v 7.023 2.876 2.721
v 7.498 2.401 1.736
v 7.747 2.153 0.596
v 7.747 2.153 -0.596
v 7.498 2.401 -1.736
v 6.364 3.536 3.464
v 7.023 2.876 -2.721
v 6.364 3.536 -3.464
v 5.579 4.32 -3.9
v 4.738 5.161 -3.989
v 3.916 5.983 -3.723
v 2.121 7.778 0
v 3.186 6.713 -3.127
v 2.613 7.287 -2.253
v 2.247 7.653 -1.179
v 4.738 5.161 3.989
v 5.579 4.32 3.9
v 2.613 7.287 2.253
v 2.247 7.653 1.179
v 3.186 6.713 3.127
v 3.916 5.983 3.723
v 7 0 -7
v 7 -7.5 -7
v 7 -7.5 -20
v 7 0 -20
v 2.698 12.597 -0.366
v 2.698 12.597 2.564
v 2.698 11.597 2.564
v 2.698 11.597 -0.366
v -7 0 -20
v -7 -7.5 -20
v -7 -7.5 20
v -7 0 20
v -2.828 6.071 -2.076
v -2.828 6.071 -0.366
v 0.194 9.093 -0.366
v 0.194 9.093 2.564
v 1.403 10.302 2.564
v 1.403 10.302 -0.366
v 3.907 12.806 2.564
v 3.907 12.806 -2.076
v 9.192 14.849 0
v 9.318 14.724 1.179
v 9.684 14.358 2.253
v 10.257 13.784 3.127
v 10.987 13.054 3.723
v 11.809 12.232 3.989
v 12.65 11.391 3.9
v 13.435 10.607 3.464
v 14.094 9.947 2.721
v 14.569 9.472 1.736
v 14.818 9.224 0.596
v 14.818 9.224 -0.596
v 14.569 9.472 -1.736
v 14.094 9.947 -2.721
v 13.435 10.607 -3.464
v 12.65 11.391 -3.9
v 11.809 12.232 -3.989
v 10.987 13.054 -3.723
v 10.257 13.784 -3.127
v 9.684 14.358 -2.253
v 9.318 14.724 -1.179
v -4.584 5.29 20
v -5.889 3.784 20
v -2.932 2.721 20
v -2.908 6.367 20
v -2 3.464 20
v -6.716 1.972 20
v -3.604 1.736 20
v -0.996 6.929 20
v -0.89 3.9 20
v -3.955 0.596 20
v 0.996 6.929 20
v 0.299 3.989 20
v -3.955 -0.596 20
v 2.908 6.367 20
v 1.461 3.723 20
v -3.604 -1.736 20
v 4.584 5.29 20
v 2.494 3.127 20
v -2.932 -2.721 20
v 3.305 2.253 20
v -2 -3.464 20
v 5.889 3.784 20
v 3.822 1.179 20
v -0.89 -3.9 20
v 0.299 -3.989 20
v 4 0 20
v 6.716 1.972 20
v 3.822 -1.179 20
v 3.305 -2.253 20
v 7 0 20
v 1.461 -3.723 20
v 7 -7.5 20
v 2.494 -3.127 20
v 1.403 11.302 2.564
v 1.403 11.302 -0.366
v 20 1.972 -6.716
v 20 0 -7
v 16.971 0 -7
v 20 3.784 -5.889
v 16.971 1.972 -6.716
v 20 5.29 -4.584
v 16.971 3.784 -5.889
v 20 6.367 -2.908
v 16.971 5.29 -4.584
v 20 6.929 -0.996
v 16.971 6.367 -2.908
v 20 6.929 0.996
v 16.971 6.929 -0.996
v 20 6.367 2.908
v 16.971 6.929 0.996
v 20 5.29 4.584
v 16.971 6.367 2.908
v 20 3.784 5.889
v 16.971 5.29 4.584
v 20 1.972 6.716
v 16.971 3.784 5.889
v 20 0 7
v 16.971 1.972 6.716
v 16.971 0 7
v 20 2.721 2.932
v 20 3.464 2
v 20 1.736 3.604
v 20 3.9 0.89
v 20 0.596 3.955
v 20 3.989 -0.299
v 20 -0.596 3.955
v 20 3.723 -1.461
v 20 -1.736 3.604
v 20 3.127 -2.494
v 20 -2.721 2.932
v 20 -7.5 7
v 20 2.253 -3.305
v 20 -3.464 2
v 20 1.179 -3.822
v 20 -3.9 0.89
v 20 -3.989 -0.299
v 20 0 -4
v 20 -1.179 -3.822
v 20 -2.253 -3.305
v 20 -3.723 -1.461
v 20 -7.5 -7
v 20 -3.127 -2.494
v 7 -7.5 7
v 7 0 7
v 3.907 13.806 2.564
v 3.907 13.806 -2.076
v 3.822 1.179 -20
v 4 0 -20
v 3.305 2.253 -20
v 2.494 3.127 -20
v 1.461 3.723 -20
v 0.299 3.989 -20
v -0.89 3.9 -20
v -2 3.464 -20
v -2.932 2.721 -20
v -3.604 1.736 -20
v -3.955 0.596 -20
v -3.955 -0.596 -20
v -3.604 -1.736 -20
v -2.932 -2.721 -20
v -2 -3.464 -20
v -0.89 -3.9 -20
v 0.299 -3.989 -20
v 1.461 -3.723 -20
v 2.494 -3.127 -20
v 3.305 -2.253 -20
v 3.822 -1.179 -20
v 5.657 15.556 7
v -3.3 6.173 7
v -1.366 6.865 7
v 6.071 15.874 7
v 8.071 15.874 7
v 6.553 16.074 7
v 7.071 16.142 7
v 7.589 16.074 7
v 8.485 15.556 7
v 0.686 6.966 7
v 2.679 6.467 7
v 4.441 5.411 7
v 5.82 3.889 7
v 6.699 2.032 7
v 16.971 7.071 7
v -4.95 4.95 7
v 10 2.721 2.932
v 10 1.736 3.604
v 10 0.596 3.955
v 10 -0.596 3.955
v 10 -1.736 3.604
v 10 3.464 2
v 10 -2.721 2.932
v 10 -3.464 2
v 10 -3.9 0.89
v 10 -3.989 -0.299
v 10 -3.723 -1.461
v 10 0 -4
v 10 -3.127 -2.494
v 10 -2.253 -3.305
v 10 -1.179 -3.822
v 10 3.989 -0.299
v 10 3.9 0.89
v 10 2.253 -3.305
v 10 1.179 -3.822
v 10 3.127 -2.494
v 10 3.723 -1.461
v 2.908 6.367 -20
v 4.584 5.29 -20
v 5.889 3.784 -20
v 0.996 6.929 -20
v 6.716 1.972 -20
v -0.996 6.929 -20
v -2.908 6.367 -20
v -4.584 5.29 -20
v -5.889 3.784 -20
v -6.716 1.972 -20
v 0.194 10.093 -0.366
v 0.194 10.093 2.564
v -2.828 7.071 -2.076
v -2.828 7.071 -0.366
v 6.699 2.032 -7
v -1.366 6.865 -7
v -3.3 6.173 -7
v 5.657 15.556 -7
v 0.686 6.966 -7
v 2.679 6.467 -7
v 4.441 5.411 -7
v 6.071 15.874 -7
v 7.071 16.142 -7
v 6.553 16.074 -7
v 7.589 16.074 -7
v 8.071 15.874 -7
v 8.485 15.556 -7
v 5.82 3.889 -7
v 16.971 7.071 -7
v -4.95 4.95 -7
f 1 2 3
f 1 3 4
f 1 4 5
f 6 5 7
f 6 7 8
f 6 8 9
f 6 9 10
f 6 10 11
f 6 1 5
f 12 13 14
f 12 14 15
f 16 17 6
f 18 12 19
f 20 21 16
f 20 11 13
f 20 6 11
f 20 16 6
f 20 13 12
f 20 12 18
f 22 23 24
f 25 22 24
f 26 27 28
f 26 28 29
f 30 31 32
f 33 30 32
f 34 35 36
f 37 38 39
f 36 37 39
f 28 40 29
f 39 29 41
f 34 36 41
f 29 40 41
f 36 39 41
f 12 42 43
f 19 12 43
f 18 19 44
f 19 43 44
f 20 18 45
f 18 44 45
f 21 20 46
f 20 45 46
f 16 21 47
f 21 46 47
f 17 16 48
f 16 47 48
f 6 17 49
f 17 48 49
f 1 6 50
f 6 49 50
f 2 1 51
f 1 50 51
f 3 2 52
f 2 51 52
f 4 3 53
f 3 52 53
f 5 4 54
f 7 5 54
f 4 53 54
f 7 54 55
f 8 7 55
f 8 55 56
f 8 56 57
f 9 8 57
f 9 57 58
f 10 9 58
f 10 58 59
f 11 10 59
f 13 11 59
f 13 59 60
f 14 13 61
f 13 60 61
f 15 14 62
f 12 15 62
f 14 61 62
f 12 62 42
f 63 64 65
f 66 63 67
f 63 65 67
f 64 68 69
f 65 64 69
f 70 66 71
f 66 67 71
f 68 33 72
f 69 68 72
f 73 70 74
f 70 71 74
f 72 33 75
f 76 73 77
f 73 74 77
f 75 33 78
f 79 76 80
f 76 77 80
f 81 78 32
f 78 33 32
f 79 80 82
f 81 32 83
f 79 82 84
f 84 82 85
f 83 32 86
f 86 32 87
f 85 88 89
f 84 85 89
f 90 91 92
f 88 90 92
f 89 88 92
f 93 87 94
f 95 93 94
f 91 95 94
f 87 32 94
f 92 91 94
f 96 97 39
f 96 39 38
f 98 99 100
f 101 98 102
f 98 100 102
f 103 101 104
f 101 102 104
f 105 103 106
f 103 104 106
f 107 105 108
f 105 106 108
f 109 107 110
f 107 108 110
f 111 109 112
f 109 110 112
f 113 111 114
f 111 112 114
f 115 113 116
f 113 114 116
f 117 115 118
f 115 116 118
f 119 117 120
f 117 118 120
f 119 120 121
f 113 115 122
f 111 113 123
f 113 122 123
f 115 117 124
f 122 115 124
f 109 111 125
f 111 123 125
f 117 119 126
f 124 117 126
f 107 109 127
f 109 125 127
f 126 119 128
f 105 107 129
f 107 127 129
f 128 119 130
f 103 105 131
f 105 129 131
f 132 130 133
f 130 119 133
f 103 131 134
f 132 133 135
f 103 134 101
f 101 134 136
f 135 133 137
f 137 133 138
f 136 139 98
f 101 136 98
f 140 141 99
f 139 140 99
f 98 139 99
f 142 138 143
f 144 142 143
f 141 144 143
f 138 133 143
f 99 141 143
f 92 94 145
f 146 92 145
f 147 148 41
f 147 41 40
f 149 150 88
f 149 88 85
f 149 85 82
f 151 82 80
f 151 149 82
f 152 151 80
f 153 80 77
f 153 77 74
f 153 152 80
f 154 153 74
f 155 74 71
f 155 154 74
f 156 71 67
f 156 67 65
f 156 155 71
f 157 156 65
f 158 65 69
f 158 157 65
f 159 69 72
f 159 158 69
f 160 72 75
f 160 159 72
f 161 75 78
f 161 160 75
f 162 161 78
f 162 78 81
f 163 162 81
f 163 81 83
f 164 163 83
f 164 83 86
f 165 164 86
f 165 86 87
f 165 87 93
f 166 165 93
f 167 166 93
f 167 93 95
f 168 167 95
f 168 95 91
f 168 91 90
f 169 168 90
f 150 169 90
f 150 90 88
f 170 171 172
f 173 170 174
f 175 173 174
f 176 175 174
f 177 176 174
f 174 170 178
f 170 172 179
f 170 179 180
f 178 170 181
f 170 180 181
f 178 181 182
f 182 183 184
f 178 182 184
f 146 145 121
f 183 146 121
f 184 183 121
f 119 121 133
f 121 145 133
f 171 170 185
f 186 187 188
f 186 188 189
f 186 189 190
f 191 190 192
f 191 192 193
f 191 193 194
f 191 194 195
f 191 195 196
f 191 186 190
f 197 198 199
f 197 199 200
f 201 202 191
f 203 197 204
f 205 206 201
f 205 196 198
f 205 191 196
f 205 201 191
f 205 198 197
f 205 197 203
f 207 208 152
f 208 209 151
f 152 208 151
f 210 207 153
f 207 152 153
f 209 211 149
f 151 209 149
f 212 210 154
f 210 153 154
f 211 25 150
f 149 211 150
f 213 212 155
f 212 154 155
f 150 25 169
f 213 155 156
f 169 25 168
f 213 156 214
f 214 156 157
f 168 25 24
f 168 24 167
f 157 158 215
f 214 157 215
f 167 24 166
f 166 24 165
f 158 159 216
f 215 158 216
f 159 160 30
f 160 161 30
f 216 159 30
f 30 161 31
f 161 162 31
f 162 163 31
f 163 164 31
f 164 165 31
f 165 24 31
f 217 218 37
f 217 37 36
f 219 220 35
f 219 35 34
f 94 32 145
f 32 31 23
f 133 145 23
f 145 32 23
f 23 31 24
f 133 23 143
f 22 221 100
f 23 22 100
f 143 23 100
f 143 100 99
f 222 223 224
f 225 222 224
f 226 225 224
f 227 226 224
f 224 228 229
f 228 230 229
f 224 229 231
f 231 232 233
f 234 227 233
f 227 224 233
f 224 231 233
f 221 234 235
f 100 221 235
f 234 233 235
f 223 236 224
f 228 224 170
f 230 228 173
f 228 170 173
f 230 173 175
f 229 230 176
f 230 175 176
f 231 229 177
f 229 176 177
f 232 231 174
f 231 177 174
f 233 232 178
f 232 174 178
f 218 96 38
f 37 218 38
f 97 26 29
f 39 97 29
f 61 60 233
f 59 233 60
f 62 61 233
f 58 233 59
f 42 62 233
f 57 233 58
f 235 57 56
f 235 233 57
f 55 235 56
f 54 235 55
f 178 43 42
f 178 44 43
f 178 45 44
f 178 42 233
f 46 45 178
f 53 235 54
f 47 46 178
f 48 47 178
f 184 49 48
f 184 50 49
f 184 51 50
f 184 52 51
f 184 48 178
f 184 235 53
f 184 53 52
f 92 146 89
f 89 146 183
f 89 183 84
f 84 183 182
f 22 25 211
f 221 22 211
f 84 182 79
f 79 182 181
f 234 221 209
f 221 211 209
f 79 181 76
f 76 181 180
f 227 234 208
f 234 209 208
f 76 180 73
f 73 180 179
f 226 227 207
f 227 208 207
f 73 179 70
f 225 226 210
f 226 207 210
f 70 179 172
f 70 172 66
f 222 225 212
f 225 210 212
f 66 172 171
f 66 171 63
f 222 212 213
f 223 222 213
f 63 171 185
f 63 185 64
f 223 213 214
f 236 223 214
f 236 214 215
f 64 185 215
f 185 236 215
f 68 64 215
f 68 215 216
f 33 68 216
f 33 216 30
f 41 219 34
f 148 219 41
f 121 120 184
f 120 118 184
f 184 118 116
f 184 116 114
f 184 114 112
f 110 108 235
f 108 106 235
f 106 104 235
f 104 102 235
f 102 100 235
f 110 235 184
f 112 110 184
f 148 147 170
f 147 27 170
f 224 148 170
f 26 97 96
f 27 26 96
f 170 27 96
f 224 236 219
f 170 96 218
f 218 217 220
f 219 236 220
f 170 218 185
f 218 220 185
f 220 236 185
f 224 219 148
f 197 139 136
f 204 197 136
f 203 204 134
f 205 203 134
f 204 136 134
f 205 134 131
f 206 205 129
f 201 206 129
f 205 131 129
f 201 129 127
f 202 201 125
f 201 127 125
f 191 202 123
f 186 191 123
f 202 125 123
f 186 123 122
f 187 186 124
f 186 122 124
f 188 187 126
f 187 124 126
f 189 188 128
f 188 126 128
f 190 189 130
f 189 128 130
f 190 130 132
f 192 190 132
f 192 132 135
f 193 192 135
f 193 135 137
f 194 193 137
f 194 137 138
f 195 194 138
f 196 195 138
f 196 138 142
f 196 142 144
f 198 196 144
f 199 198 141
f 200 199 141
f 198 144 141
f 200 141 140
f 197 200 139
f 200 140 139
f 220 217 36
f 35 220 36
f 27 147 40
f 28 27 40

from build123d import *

# Parameters (mm, degrees)
DODANIE_WYCI_GNI_CIE1_DEPTH      = 20
DODANIE_WYCI_GNI_CIE1_DEPTH_BACK = 20
SZKIC1_R                         = 7
SZKIC1_R_2                       = 4
DODANIE_WYCI_GNI_CIE2_DEPTH      = 10
DODANIE_WYCI_GNI_CIE2_DEPTH_BACK = 10
SZKIC2_R                         = 4
DODANIE_WYCI_GNI_CIE4_START      = -7
SZKIC3_W                         = 14
SZKIC3_H                         = 14
DODANIE_WYCI_GNI_CIE4_DEPTH      = 17
SZKIC9_R                         = 7
DODANIE_WYCI_GNI_CIE6_DEPTH      = 20
SZKIC4_R                         = 4
WYTNIJ_WYCI_GNI_CIE1_DEPTH       = 10
DODANIE_WYCI_GNI_CIE7_REACH      = 39.401
DODANIE_WYCI_GNI_CIE8_START      = -7
DODANIE_WYCI_GNI_CIE8_DEPTH      = 14
SZKIC11_R                        = 4
WYTNIJ_WYCI_GNI_CIE2_DEPTH       = 10
SZKIC12_R                        = 4
WYTNIJ_WYCI_GNI_CIE3_DEPTH       = 40.84971769
ZAOKR_GLENIE1_R                  = 2
WYTNIJ_WYCI_GNI_CIE4_DEPTH       = 1


with BuildPart() as part:
    # Szkic1 → Dodanie-wyciągnięcie1 (new, two sides: drawn at the far end of the back side and taken through both)
    with BuildSketch(Plane.XY.offset(-DODANIE_WYCI_GNI_CIE1_DEPTH_BACK)):
        Circle(SZKIC1_R)
        Circle(SZKIC1_R_2, mode=Mode.SUBTRACT)
    extrude(amount=DODANIE_WYCI_GNI_CIE1_DEPTH + DODANIE_WYCI_GNI_CIE1_DEPTH_BACK)

    # Szkic2 → Dodanie-wyciągnięcie2 (add, two sides: drawn at the far end of the back side and taken through both)
    with BuildSketch(Plane.XY.offset(-DODANIE_WYCI_GNI_CIE2_DEPTH_BACK)):
        Circle(SZKIC2_R)
    extrude(amount=DODANIE_WYCI_GNI_CIE2_DEPTH + DODANIE_WYCI_GNI_CIE2_DEPTH_BACK)

    # Szkic3 → Dodanie-wyciągnięcie4 (add)
    with BuildSketch(Plane(origin=(4.949747468, 4.949747468, 0), x_dir=(0, 0, 1), z_dir=(0.7071067811865438, 0.7071067811865512, 0)).offset(DODANIE_WYCI_GNI_CIE4_START)):
        Rectangle(SZKIC3_W, SZKIC3_H)
    extrude(amount=DODANIE_WYCI_GNI_CIE4_DEPTH)

    # Szkic9 → Dodanie-wyciągnięcie6 (add)
    with BuildSketch(Plane(origin=(0, 0, 0), x_dir=(0, 0, -1), z_dir=(1, 0, 0))):
        Circle(SZKIC9_R)
    extrude(amount=DODANIE_WYCI_GNI_CIE6_DEPTH)

    # Szkic4 → Wytnij-wyciągnięcie1 (cut)
    with BuildSketch(Plane(origin=(12.02081528, 12.02081528, 0), x_dir=(0, 0, -1), z_dir=(0.7071067811865438, 0.7071067811865513, 0))):
        with Locations(Location((0, 0, 0), (0, 0, 90))):
            Circle(SZKIC4_R)
    extrude(amount=-WYTNIJ_WYCI_GNI_CIE1_DEPTH, mode=Mode.SUBTRACT)

    # Szkic10 → Dodanie-wyciągnięcie7 (add, up to next)
    with BuildSketch(Plane(origin=(0, -7.5, 0), x_dir=(1, 0, 0), z_dir=(0, 1, 0)), mode=Mode.PRIVATE) as dodanie_wyci_gni_cie7_sk1:
        Polygon((-7, 20), (-7, -20), (7, -20), (7, -7), (20, -7), (20, 7), (7, 7), (7, 20), align=None)
    dodanie_wyci_gni_cie7_tool1 = extrude(dodanie_wyci_gni_cie7_sk1.sketch, amount=DODANIE_WYCI_GNI_CIE7_REACH, mode=Mode.PRIVATE) - part.part
    add(dodanie_wyci_gni_cie7_tool1.solids().sort_by_distance((3.311321, -7.5, 0))[0])

    # Dodanie-wyciągnięcie8: read off the stored shape, not the designer's step
    # Dodanie-wyciągnięcie8 outline → Dodanie-wyciągnięcie8 (add)
    with BuildSketch(Plane.XY.offset(DODANIE_WYCI_GNI_CIE8_START)):
        Polygon((16.970562748, -2), (16.970562748, 7.071067812), (9.899494937, 0), (8, -1.899494937), (8, -2), align=None)
    extrude(amount=DODANIE_WYCI_GNI_CIE8_DEPTH)

    # Szkic11 → Wytnij-wyciągnięcie2 (cut)
    with BuildSketch(Plane(origin=(20, 0, 0), x_dir=(0, 0, -1), z_dir=(1, 0, 0))):
        Circle(SZKIC11_R)
    extrude(amount=-WYTNIJ_WYCI_GNI_CIE2_DEPTH, mode=Mode.SUBTRACT)

    # Szkic12 → Wytnij-wyciągnięcie3 (cut, through all)
    with BuildSketch(Plane.XY.offset(10)):
        Circle(SZKIC12_R)
    extrude(amount=-WYTNIJ_WYCI_GNI_CIE3_DEPTH, mode=Mode.SUBTRACT)

    # Zaokrąglenie1
    zaokr_glenie1_edges = [part.edges().sort_by_distance(p)[0] for p in [
        (7.071067812, 16.970562748, 0),
    ]]
    fillet(zaokr_glenie1_edges, radius=ZAOKR_GLENIE1_R)

    # Szkic14 → Wytnij-wyciągnięcie4 (cut, along a direction that is not the sketch's normal)
    with BuildSketch(Plane(origin=(-4.949747468, 4.949747468, 0), x_dir=(0, 0, 1), z_dir=(-0.7071067811865513, 0.7071067811865438, 0))):
        Polygon((-2.075961538, 12.525), (2.564423077, 12.525), (2.564423077, 10.815384615), (-0.366346154, 10.815384615), (-0.366346154, 8.983653846), (2.564423077, 8.983653846), (2.564423077, 7.274038462), (-0.366346154, 7.274038462), (-0.366346154, 3), (-2.075961538, 3), align=None)
    extrude(amount=-WYTNIJ_WYCI_GNI_CIE4_DEPTH, dir=(0, 1, 0), mode=Mode.SUBTRACT)


solid = part.part
